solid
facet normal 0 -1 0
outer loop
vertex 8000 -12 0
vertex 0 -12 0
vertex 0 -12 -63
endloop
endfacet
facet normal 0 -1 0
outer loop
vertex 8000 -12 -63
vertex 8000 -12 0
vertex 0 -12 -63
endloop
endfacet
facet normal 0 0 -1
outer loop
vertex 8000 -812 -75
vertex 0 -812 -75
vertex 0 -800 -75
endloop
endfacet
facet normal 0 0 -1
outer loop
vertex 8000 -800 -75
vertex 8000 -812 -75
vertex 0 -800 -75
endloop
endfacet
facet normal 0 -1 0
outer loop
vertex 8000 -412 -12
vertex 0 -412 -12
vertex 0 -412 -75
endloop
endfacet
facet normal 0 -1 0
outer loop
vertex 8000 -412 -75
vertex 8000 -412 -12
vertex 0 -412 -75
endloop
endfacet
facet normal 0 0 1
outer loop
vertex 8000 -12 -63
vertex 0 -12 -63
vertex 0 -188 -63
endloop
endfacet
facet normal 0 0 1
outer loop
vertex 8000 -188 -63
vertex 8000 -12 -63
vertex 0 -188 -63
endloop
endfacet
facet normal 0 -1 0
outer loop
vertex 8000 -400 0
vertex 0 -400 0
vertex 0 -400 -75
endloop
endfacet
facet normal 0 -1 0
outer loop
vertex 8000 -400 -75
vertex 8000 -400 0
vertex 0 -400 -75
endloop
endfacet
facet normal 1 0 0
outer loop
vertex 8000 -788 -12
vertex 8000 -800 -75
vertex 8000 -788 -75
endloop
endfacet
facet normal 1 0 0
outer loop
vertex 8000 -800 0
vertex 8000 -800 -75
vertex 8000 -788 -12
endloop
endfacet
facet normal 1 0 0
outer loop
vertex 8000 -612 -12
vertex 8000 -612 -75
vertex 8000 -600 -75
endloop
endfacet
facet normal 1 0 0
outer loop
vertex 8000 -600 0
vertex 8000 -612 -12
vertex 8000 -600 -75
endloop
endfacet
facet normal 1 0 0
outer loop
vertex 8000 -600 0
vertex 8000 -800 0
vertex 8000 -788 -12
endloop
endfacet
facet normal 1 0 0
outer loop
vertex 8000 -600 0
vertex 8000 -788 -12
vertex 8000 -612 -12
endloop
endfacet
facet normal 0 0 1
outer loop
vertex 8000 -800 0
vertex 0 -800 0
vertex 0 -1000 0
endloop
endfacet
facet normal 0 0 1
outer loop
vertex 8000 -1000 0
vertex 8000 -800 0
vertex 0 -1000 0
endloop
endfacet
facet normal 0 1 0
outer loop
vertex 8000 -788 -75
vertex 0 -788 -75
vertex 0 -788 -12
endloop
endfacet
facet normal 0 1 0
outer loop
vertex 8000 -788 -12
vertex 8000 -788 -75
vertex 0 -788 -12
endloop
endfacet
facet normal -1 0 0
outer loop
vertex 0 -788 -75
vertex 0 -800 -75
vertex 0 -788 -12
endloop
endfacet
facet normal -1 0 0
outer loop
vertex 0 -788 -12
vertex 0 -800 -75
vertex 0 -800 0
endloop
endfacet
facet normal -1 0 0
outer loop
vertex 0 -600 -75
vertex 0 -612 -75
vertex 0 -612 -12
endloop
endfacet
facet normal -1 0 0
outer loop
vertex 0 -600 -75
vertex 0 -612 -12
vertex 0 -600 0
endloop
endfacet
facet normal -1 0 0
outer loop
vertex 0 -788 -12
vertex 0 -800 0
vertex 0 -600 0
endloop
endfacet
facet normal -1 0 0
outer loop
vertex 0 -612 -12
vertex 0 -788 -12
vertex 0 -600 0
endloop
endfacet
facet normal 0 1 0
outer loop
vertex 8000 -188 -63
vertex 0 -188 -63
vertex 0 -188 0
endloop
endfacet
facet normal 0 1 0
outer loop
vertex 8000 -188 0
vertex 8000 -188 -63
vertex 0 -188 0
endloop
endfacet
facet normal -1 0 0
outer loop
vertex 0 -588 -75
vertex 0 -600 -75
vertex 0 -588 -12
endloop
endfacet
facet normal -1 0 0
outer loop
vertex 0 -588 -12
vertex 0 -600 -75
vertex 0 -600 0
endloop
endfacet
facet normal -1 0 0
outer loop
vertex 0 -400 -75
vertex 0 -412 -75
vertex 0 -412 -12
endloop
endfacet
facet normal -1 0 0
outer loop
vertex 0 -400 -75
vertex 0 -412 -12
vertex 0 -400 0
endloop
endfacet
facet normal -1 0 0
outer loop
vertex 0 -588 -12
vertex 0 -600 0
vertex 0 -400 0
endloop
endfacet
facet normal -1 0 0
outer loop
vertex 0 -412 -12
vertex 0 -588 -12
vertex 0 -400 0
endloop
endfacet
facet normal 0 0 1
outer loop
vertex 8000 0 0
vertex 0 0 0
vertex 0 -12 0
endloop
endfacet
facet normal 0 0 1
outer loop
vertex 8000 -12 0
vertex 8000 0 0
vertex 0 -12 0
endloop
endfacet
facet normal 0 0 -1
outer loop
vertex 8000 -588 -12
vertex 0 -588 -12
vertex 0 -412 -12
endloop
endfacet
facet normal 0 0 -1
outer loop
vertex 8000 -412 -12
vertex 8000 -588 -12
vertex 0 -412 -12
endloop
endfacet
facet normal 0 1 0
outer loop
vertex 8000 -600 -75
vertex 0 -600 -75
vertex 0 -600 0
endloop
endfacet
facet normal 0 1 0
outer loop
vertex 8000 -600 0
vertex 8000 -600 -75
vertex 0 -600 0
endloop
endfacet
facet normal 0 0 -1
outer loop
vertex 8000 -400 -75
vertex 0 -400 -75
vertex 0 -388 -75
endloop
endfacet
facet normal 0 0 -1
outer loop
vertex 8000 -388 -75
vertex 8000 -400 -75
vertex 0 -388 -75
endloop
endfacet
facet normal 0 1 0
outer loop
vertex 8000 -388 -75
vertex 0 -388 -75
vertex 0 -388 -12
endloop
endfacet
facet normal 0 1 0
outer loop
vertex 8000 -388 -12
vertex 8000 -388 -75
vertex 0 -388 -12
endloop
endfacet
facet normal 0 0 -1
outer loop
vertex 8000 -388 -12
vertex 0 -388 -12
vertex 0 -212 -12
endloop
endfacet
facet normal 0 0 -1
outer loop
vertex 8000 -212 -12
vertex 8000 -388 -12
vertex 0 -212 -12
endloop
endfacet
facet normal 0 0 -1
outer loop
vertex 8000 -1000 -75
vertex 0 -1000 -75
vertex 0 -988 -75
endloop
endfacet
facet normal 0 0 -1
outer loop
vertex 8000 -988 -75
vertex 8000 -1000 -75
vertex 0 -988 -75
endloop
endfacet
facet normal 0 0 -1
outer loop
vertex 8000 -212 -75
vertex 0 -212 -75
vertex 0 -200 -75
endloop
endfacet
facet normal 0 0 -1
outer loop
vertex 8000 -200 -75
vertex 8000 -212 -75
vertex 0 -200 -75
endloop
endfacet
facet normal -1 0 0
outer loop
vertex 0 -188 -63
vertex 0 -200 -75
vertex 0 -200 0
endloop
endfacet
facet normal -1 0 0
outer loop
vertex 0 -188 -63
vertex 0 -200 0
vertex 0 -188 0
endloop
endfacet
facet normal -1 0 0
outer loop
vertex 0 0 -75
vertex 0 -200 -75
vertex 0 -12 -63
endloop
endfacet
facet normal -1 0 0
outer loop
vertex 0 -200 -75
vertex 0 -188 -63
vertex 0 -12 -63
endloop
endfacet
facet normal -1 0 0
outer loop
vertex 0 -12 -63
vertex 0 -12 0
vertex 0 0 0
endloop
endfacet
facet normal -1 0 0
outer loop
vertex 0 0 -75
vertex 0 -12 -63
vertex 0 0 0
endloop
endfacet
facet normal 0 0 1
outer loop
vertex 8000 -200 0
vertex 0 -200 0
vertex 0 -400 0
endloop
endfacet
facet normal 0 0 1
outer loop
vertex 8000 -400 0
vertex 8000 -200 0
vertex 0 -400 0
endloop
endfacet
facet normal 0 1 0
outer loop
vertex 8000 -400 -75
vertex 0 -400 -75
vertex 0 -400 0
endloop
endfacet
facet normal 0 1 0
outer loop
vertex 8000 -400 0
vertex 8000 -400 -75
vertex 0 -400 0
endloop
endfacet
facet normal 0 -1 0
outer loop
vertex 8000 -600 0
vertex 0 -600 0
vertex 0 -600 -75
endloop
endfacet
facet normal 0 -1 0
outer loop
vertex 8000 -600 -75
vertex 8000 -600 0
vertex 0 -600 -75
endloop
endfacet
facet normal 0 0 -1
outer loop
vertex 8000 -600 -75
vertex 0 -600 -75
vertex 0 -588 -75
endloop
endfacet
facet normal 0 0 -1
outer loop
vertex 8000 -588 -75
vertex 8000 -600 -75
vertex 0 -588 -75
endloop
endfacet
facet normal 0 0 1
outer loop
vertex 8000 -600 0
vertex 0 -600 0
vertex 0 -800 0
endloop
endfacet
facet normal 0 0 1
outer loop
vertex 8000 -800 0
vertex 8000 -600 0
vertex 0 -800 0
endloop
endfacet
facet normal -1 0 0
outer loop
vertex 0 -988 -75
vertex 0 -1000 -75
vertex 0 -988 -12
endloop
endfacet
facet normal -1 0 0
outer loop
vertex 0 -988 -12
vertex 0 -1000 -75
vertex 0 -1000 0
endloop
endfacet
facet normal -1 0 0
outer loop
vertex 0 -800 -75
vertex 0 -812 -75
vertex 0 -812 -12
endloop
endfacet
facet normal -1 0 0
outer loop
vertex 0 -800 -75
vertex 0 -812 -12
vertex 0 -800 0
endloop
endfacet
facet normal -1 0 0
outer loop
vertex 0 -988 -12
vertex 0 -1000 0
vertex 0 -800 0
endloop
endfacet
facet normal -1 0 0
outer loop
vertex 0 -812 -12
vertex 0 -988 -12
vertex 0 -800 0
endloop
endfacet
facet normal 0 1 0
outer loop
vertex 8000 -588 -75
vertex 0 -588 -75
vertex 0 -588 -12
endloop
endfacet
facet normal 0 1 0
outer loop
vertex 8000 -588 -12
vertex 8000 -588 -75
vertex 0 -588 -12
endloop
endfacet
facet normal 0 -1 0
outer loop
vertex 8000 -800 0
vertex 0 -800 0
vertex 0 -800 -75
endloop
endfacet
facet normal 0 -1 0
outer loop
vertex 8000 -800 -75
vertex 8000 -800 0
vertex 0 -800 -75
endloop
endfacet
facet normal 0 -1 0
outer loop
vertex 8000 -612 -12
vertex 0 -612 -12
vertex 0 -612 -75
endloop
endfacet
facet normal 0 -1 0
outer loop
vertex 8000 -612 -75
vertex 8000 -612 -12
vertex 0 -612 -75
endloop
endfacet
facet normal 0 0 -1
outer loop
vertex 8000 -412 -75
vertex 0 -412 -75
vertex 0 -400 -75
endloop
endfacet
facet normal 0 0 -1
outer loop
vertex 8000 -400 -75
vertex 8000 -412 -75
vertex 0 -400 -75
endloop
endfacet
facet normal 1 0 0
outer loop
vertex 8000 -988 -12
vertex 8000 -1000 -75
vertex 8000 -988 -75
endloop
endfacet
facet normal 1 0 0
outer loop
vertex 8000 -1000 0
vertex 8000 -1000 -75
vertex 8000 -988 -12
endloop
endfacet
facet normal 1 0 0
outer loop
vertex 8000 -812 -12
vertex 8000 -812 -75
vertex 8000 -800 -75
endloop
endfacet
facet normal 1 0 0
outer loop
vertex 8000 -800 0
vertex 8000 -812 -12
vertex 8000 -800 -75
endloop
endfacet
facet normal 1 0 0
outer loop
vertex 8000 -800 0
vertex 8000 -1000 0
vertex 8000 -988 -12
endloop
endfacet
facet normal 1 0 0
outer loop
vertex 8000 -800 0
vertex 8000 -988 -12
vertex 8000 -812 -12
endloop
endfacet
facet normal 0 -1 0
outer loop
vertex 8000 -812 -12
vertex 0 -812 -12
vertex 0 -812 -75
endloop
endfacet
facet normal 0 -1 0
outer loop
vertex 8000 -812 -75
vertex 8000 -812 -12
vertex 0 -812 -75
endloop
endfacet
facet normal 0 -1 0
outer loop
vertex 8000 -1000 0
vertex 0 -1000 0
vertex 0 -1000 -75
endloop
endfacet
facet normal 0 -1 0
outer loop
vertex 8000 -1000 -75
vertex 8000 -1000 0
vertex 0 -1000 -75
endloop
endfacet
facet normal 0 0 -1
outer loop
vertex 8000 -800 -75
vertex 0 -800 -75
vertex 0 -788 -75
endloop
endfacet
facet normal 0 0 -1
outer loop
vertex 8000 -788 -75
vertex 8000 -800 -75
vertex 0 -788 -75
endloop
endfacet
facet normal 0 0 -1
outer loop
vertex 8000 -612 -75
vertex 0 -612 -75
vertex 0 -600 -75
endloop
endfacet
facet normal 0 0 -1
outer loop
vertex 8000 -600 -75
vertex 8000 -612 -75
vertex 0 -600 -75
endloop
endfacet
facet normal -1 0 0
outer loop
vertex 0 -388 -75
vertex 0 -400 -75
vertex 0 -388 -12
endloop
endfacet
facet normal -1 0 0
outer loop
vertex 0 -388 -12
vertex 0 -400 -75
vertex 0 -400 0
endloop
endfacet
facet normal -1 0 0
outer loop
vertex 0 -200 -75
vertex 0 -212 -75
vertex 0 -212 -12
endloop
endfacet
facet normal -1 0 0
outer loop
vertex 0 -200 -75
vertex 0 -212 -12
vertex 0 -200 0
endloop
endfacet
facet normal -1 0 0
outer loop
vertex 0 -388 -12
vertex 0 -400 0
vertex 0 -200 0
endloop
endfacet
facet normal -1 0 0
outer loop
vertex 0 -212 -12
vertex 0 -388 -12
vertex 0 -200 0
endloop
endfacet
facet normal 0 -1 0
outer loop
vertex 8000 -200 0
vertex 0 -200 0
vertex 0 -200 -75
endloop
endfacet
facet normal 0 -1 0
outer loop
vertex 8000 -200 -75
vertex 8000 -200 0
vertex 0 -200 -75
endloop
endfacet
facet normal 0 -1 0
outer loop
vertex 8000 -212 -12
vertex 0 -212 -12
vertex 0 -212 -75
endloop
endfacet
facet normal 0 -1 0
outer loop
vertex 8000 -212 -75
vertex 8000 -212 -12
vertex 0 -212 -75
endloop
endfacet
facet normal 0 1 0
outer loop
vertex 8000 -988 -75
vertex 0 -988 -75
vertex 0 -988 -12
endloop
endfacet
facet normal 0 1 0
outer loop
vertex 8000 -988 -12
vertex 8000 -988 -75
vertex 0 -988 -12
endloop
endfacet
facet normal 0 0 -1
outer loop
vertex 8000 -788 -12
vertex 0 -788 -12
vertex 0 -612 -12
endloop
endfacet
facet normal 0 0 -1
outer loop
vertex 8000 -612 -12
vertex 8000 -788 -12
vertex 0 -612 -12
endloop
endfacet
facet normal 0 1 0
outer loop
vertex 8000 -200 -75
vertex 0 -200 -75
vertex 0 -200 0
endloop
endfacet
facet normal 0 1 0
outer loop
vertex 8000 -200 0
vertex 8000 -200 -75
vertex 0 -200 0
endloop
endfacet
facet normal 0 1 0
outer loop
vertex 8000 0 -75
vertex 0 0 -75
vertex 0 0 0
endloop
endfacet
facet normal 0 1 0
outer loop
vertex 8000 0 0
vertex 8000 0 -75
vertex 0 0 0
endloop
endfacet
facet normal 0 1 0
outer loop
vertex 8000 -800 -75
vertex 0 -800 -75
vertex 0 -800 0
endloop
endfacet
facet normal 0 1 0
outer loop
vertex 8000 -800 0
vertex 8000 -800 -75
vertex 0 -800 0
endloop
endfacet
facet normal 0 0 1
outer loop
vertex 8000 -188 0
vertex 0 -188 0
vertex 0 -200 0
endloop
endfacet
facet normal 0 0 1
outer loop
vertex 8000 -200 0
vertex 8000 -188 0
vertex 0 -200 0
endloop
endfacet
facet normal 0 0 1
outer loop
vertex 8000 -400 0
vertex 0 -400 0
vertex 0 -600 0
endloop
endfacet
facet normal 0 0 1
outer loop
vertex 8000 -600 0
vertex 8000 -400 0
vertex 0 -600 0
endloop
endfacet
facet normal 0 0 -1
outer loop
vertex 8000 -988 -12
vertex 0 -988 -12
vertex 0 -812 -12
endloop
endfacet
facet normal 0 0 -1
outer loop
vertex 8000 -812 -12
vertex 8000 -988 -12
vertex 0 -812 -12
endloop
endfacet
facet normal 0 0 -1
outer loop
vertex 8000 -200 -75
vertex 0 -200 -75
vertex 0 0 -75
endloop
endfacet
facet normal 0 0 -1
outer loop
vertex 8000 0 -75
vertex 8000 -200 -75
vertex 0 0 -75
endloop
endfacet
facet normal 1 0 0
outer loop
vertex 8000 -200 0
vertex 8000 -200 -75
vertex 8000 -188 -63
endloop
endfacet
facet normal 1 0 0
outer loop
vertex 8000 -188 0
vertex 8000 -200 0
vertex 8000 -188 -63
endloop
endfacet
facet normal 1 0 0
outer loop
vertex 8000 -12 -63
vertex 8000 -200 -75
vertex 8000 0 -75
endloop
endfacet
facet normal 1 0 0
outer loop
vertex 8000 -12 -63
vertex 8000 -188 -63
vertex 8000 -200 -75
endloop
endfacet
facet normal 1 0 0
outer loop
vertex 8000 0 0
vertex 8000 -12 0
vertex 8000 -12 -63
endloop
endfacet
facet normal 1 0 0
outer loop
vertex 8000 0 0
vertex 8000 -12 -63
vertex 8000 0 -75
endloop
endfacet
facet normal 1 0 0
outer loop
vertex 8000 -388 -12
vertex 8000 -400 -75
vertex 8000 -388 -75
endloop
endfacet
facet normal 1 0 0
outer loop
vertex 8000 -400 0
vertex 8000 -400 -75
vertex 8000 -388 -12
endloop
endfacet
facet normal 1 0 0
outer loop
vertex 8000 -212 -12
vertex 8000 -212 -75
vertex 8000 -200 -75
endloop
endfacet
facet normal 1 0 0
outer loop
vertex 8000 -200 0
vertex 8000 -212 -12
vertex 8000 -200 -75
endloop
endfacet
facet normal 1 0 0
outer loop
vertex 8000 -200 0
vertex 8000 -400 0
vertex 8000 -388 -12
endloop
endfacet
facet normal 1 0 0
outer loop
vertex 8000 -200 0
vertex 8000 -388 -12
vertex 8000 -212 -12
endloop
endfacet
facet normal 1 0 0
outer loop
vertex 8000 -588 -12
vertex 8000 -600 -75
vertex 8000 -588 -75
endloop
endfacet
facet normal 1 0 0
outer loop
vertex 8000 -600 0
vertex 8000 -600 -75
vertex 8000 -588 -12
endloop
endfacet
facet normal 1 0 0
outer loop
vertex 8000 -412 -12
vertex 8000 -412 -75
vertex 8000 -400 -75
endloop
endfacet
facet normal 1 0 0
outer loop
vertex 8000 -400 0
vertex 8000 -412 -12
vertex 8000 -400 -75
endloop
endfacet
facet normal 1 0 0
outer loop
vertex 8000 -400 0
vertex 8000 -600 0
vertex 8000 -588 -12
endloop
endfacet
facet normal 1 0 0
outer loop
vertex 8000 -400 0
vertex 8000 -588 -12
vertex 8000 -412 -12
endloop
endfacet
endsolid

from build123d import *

# Parameters (mm, degrees)
F1_DEPTH = 8000
F2_DEPTH = 8000
F3_DEPTH = 8000
F4_DEPTH = 8000
F5_DEPTH = 8000


# Not quite as in the source:
# - a feature of the source that left no trace in its solid (it failed there, or was rolled back) is left out


with BuildPart() as f1:
    # F0 (on Right) → F1 (new body)
    with BuildSketch(Plane.YZ):
        Polygon((0, -75), (0, 0), (-12, 0), (-12, -63), (-188, -63), (-188, 0), (-200, 0), (-200, -75), align=None)
    extrude(amount=F1_DEPTH)


with BuildPart() as f2:
    # F0 (on Right) → F2 (new body)
    with BuildSketch(Plane.YZ):
        Polygon((-212, -75), (-200, -75), (-200, 0), (-400, 0), (-400, -75), (-388, -75), (-388, -12), (-212, -12), align=None)
    extrude(amount=F2_DEPTH)


with BuildPart() as f3:
    # F0 (on Right) → F3 (new body)
    with BuildSketch(Plane.YZ):
        Polygon((-400, -75), (-400, 0), (-600, 0), (-600, -75), (-588, -75), (-588, -12), (-412, -12), (-412, -75), align=None)
    extrude(amount=F3_DEPTH)


with BuildPart() as f4:
    # F0 (on Right) → F4 (new body)
    with BuildSketch(Plane.YZ):
        Polygon((-600, -75), (-600, 0), (-800, 0), (-800, -75), (-788, -75), (-788, -12), (-612, -12), (-612, -75), align=None)
    extrude(amount=F4_DEPTH)


with BuildPart() as f5:
    # F0 (on Right) → F5 (new body)
    with BuildSketch(Plane.YZ):
        Polygon((-800, -75), (-800, 0), (-812, 0), (-988, 0), (-1000, 0), (-1000, -75), (-988, -75), (-988, -12), (-812, -12), (-812, -75), align=None)
    extrude(amount=F5_DEPTH)


solid = Compound([f1.part, f2.part, f3.part, f4.part, f5.part])
